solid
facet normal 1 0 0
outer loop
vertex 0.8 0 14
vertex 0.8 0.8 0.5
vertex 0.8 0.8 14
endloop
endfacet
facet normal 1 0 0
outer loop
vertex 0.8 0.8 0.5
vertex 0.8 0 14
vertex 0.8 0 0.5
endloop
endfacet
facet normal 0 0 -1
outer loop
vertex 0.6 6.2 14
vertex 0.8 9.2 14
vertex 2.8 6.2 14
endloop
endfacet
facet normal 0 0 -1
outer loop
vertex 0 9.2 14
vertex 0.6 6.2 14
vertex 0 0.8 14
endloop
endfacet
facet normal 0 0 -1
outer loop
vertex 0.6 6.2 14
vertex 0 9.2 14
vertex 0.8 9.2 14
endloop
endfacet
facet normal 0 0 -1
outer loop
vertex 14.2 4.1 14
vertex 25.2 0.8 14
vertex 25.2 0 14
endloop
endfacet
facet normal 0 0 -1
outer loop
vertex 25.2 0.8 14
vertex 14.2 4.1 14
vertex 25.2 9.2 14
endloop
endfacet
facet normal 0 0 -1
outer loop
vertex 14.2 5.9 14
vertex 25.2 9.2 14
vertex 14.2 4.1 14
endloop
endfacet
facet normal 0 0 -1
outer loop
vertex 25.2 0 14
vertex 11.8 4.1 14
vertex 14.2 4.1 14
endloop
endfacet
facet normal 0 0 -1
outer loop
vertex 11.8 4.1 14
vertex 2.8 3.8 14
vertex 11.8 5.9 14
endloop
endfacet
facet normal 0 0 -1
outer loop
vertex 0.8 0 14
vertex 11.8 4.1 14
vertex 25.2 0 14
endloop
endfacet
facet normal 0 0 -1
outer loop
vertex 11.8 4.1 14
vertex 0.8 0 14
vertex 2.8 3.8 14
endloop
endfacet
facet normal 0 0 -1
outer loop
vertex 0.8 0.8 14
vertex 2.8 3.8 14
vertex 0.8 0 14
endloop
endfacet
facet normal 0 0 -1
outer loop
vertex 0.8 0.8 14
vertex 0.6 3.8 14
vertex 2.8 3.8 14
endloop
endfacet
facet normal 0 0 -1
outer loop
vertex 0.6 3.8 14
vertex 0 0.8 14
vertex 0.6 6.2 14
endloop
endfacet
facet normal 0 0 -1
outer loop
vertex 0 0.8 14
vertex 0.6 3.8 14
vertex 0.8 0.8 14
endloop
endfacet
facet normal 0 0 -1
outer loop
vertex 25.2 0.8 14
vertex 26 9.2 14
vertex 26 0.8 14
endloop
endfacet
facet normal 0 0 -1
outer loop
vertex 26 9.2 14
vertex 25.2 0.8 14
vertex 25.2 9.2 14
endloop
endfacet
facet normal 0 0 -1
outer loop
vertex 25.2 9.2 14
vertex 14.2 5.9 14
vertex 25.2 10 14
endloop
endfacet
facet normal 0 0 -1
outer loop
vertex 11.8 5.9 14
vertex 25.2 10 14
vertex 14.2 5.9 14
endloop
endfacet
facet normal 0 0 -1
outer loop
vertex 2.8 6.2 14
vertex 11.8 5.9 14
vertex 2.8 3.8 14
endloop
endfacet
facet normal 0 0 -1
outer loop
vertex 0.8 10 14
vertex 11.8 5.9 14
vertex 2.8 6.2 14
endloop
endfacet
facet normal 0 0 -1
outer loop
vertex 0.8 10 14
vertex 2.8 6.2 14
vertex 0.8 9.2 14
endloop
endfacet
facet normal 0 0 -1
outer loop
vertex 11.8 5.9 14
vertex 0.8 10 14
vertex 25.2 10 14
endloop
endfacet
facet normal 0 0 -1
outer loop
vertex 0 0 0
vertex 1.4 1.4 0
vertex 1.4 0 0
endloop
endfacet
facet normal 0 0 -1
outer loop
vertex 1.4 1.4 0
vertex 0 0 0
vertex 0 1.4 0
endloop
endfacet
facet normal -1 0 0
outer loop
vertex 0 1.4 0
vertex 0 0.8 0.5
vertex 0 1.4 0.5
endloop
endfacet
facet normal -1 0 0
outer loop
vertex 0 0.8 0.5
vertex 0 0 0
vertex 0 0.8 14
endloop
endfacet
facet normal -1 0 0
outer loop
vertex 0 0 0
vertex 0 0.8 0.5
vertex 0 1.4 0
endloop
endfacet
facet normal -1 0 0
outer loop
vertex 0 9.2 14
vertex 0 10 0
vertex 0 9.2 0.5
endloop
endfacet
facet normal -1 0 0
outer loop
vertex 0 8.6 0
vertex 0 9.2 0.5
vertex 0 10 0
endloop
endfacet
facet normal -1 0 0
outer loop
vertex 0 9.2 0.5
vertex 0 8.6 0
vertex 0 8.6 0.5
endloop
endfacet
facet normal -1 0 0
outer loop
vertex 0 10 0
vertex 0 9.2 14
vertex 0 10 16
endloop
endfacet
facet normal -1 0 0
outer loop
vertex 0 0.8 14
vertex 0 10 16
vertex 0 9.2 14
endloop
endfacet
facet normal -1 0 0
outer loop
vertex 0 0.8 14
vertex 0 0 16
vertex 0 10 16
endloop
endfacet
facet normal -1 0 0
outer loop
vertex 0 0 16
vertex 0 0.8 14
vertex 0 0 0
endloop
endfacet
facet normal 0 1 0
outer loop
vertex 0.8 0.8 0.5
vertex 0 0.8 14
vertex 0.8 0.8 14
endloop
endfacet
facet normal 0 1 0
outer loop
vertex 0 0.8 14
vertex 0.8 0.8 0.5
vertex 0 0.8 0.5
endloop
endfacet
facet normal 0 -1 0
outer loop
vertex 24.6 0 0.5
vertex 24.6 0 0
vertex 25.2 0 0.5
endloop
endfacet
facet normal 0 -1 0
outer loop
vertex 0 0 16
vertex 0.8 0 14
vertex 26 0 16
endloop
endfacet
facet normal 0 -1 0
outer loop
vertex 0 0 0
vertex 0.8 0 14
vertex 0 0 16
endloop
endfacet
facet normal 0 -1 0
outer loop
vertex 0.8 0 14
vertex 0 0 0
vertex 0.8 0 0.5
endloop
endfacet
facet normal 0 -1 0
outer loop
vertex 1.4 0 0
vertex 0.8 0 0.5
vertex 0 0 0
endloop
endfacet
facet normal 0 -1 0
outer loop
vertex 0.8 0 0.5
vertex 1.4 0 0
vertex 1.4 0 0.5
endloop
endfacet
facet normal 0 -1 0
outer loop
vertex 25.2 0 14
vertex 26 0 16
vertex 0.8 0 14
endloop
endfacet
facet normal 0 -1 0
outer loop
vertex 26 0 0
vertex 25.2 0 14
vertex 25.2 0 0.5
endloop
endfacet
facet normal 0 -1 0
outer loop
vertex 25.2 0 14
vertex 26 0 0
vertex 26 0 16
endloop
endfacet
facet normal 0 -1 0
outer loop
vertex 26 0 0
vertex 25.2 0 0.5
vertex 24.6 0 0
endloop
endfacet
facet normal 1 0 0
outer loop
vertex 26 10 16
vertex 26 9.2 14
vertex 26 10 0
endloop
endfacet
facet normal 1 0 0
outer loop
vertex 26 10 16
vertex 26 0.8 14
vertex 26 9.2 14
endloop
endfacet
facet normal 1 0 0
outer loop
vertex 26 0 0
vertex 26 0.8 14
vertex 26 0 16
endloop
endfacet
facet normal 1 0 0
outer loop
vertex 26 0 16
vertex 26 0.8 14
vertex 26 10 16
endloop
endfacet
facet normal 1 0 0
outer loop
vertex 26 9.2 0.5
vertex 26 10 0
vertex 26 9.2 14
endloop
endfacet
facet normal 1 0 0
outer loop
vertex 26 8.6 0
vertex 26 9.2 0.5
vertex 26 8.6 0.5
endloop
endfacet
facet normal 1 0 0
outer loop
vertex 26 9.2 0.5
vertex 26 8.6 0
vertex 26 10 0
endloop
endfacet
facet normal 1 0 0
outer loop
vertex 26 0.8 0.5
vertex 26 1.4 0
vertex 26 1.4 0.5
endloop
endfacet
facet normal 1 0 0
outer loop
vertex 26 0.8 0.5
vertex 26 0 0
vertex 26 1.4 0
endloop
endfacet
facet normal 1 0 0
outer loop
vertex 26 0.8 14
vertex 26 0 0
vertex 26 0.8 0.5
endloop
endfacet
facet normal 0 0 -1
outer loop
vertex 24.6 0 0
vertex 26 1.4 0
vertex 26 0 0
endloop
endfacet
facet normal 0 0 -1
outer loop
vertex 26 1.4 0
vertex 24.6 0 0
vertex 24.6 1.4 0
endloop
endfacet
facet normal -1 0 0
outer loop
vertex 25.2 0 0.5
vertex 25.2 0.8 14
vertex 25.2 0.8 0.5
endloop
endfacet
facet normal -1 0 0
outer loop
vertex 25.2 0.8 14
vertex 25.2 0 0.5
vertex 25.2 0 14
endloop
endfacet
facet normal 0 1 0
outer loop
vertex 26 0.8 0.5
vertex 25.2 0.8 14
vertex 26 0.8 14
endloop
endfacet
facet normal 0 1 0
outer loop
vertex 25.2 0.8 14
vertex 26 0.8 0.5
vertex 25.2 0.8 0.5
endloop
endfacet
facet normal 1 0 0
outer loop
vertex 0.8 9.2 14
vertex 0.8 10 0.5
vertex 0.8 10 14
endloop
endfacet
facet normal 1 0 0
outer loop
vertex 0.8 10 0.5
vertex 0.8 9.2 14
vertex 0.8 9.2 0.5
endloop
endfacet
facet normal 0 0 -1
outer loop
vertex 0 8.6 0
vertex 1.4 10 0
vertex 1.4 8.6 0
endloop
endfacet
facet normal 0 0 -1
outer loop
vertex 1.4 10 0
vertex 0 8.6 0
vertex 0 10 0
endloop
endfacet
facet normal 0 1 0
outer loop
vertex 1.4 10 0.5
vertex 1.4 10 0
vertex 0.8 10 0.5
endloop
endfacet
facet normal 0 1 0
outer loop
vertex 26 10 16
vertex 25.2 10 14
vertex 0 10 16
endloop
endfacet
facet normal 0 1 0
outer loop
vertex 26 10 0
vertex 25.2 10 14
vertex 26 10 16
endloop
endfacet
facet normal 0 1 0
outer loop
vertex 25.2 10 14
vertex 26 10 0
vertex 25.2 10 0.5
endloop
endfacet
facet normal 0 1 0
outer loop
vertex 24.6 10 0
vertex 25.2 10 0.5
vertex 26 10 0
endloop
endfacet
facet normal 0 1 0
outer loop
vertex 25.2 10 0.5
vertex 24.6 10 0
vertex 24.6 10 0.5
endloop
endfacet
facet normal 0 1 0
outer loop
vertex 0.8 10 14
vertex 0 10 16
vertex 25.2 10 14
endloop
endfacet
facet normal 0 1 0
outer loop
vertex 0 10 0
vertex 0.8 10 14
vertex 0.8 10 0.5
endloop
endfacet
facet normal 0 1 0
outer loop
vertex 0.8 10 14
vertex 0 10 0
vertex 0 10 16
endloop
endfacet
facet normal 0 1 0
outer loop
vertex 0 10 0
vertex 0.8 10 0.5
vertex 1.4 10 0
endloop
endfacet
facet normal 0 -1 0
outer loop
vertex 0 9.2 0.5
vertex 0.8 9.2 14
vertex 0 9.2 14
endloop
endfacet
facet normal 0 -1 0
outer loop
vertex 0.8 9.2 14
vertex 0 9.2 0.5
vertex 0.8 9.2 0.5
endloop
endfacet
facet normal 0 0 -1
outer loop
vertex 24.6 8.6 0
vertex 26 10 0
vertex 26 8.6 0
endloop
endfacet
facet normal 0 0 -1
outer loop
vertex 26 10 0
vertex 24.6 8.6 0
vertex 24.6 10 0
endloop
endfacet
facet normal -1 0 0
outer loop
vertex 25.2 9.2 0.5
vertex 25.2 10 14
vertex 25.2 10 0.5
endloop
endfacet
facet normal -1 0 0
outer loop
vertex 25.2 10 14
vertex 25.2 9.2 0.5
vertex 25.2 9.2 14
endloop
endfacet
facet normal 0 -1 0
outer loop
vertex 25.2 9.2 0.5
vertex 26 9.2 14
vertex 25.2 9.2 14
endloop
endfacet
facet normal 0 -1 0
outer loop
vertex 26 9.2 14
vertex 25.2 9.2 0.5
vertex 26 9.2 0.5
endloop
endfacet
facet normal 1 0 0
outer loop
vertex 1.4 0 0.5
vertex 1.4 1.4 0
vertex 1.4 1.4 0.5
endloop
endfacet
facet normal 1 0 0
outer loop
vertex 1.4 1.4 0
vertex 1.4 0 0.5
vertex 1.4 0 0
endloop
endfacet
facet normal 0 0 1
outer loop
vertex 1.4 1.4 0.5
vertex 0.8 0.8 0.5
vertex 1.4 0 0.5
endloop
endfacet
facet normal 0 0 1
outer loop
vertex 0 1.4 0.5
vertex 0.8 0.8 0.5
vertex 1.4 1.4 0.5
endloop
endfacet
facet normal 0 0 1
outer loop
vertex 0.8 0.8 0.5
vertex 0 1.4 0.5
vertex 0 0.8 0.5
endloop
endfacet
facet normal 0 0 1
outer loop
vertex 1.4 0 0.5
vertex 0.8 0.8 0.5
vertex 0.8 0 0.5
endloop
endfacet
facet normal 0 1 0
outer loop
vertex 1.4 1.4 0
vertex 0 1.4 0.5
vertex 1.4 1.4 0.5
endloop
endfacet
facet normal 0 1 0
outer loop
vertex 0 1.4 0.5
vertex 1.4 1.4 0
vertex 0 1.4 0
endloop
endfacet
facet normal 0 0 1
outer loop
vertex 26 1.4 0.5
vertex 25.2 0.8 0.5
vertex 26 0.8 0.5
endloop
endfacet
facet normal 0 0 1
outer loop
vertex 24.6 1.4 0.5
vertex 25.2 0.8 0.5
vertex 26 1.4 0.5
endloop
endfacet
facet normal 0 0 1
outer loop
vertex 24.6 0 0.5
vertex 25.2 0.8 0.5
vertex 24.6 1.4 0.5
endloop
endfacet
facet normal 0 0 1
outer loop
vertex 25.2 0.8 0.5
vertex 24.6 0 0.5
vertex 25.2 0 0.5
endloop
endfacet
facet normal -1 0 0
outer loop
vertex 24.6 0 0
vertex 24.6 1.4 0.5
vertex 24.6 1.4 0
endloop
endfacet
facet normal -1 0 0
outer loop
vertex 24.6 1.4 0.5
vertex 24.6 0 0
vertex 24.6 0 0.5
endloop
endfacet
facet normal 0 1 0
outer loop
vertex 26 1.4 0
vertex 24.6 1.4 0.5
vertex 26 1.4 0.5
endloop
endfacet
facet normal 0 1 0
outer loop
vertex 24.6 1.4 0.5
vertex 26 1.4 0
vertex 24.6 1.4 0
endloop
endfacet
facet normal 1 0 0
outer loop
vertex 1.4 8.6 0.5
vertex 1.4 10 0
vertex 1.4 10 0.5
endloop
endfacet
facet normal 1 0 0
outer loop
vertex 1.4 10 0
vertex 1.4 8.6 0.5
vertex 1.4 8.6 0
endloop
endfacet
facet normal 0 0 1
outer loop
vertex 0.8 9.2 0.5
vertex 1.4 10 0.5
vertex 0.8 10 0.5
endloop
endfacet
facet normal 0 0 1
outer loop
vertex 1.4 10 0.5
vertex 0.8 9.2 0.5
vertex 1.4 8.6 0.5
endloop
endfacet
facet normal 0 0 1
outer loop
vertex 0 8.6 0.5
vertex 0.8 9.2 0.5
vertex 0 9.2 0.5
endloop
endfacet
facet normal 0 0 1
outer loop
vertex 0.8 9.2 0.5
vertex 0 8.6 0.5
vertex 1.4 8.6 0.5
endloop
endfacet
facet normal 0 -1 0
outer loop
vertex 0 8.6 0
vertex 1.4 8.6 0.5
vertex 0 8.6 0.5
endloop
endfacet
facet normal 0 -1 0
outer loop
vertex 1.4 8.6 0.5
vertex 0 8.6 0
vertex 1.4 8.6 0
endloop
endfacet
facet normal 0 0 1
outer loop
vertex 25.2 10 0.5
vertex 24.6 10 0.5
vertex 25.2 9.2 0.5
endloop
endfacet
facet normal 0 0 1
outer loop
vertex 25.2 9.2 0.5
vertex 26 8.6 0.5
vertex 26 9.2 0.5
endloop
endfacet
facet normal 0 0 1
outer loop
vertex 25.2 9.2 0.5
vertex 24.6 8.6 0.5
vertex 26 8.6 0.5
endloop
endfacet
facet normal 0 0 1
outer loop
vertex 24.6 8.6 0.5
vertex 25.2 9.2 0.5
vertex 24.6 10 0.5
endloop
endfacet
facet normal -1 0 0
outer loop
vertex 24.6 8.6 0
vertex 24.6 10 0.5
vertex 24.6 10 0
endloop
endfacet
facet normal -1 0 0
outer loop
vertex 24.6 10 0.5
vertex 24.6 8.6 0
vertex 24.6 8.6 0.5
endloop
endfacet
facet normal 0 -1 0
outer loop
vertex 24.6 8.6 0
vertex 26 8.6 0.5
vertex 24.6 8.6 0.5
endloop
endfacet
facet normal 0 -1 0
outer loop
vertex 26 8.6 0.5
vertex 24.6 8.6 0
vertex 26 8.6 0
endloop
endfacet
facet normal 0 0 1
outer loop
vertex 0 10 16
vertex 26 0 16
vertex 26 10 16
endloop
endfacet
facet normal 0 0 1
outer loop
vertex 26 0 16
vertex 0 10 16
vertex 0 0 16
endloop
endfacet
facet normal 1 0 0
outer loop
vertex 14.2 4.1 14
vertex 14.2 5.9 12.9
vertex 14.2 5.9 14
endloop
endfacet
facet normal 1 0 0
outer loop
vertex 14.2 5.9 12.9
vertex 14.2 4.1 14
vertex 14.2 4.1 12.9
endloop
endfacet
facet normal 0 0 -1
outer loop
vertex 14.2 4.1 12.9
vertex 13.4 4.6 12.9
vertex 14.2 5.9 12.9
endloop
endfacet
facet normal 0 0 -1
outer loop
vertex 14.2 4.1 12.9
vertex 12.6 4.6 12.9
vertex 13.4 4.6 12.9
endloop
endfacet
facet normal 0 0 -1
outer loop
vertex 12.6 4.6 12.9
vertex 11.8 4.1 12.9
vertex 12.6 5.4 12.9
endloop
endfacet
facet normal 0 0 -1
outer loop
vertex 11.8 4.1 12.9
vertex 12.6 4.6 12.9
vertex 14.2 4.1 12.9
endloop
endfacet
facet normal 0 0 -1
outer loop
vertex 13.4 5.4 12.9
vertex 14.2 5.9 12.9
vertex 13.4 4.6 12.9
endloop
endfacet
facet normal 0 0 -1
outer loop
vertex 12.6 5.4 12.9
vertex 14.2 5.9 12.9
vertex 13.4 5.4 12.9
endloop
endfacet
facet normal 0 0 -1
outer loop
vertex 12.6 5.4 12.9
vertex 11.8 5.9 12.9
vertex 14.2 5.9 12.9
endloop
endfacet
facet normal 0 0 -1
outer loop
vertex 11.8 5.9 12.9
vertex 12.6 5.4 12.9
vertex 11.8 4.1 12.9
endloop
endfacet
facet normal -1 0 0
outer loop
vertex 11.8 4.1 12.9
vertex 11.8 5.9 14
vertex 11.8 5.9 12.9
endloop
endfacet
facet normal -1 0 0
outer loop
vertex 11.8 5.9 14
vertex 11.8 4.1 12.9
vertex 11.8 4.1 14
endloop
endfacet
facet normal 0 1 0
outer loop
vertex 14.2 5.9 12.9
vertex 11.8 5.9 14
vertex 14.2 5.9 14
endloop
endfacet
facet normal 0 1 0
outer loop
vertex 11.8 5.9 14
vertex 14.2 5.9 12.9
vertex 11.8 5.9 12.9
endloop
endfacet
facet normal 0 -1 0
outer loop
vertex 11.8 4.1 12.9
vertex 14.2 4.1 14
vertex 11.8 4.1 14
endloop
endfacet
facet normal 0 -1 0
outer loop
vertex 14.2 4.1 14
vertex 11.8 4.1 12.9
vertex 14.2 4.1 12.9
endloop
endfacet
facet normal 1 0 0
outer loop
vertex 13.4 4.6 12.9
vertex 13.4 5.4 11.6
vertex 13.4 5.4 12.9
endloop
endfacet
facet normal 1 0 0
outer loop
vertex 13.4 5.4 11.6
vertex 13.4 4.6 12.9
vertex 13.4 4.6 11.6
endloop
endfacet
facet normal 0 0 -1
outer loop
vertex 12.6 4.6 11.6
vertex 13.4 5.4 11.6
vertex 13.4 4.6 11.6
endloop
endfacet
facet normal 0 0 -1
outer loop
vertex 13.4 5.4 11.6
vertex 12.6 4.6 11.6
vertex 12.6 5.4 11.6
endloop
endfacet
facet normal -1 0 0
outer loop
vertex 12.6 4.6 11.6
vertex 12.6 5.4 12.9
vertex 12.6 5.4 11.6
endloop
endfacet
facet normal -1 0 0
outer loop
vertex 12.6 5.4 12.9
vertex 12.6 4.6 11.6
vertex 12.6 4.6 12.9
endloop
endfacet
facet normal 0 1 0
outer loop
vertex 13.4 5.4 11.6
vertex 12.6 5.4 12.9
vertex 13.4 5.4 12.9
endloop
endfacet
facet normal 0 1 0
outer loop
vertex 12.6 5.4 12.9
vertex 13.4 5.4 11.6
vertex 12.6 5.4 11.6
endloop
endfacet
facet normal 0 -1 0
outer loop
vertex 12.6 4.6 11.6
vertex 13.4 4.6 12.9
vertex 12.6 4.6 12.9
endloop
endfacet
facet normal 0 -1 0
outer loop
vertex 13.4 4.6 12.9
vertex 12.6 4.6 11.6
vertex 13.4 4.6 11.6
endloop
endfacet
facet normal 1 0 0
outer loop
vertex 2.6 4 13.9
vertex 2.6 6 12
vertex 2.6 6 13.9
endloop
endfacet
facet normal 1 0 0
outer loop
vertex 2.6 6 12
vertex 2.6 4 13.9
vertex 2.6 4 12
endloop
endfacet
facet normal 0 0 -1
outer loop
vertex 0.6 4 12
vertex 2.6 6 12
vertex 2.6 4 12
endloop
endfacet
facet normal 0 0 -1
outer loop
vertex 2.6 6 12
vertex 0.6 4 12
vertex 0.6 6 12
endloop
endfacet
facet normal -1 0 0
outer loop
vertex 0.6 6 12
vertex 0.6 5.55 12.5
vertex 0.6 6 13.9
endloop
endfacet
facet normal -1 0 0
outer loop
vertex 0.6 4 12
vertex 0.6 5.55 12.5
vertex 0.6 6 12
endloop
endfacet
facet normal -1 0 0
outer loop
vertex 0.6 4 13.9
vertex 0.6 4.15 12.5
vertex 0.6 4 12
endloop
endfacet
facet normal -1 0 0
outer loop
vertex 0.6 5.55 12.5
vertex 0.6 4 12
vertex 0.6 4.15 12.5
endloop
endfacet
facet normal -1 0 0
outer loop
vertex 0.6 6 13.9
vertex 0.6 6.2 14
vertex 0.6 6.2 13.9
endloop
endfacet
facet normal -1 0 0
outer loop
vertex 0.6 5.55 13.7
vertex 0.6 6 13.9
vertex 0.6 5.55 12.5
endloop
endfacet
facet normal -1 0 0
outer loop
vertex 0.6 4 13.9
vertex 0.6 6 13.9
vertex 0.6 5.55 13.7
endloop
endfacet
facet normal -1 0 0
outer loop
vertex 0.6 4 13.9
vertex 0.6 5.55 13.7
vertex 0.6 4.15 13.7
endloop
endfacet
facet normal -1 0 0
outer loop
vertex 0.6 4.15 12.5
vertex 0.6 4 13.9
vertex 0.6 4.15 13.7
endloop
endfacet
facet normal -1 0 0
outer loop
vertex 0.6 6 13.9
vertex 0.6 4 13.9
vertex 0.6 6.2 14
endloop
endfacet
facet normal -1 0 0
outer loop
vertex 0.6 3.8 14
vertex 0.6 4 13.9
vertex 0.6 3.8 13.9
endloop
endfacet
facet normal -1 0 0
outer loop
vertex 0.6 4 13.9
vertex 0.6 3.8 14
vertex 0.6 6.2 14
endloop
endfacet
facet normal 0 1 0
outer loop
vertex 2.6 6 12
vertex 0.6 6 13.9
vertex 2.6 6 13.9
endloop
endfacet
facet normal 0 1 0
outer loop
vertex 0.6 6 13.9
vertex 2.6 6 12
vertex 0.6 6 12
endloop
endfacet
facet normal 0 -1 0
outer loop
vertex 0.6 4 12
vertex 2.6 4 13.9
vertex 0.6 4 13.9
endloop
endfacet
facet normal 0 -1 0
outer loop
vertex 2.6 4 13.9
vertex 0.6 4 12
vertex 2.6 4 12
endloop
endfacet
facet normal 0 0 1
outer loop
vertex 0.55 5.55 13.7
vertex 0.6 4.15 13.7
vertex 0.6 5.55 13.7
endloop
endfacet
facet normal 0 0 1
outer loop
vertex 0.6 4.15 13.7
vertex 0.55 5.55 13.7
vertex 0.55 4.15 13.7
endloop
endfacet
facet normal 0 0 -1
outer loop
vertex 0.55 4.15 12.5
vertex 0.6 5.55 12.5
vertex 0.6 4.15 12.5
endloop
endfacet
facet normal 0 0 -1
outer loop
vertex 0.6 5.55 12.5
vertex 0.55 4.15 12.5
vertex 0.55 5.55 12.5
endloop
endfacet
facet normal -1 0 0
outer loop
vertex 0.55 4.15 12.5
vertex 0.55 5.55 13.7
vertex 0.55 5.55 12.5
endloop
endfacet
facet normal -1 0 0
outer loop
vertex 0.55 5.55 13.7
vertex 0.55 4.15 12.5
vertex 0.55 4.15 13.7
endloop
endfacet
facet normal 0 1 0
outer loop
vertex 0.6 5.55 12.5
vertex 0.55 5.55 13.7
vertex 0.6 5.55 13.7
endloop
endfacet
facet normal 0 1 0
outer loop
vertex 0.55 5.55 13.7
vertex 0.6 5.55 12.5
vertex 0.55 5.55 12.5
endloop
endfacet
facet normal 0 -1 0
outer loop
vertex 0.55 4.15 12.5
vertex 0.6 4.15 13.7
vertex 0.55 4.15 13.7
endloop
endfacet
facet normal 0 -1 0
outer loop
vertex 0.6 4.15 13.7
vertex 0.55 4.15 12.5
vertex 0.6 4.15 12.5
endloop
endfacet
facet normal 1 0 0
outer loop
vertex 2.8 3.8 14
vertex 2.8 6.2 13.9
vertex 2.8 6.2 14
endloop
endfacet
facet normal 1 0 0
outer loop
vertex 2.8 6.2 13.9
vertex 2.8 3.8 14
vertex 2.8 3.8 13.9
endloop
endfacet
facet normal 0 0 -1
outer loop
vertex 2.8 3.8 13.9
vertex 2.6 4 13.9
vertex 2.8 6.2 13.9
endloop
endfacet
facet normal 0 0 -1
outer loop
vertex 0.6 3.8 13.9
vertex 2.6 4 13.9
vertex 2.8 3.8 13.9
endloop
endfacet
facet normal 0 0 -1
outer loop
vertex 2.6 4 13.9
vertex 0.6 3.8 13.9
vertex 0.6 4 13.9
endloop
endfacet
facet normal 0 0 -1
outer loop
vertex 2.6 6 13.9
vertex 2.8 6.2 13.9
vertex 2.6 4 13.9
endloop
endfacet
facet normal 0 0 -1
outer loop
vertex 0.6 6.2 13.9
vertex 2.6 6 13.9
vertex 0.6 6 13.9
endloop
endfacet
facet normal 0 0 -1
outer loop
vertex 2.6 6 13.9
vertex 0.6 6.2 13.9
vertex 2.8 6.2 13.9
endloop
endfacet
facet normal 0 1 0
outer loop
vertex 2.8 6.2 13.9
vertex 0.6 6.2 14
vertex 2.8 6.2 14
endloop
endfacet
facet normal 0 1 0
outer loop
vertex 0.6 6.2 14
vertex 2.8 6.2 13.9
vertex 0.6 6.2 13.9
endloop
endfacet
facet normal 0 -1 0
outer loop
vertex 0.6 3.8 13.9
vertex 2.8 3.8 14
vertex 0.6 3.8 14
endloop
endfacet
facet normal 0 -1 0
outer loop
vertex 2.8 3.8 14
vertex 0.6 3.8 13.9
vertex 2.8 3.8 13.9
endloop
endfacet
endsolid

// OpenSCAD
// 龙门吊 (battle_crane) — 港口集装箱装卸区地标
// 轴: x=宽(26), y=深(10), z=高(16); 原点在角(0,0,0); 主梁沿 X 横跨
// 四门腿(截面 0.8, 高 14) + 桁架主梁(26×10×2) + 小车吊钩 + 司机室
// 腿间净空 14m 可通行, 主梁高空(≥14m)只挡弹道
// 碰撞契约: 四腿 0.8²×14 + 主梁 26×10×2 → GLB bbox 必须精确 26×10×16
$fn = 8;

module legs() {
  // 四门腿 (截面 0.8, 高 14, 放四角)
  for (y = [0, 9.2]) for (x = [0, 25.2]) {
    color([0.55, 0.42, 0.30]) translate([x, y, 0]) cube([0.8, 0.8, 14]);
  }
  // 腿底基座板 (防倒, 压在 bbox 内 0-26 × 0-10; 腿 y=9.2 → 基座 y 8.6-10.0 不超深 10)
  for (y = [0, 8.6]) for (x = [0, 24.6]) {
    color([0.50, 0.38, 0.28]) translate([x, y, 0]) cube([1.4, 1.4, 0.5]);
  }
}

module beam() {
  // 主梁 (26×10×2, z 14-16)
  color([0.65, 0.55, 0.38]) translate([0, 0, 14]) cube([26, 10, 2]);
  // 梁端封板
  color([0.60, 0.50, 0.34]) translate([0, 0, 14]) cube([0.4, 10, 2]);
  color([0.60, 0.50, 0.34]) translate([25.6, 0, 14]) cube([0.4, 10, 2]);
}

module trolley() {
  // 小车 (2.4×1.8×1.1) 挂主梁下 z 12.9-14
  color([0.50, 0.42, 0.34]) translate([11.8, 4.1, 12.9]) cube([2.4, 1.8, 1.1]);
  // 吊钩柱 (0.8×0.8×1.3, z 11.6-12.9)
  color([0.45, 0.38, 0.30]) translate([12.6, 4.6, 11.6]) cube([0.8, 0.8, 1.3]);
}

module cab() {
  // 司机室 (2×2×2) 挂主梁下 x 端, z 12-14
  color([0.45, 0.48, 0.55]) translate([0.6, 4, 12]) cube([2, 2, 2]);
  // 司机室窗 (朝 y=+深面)
  color([0.55, 0.72, 0.85]) translate([0.55, 4.15, 12.5]) cube([0.15, 1.4, 1.2]);
  // 雨檐
  color([0.40, 0.42, 0.48]) translate([0.6, 3.8, 13.9]) cube([2.2, 2.4, 0.15]);
}

legs();
beam();
trolley();
cab();
